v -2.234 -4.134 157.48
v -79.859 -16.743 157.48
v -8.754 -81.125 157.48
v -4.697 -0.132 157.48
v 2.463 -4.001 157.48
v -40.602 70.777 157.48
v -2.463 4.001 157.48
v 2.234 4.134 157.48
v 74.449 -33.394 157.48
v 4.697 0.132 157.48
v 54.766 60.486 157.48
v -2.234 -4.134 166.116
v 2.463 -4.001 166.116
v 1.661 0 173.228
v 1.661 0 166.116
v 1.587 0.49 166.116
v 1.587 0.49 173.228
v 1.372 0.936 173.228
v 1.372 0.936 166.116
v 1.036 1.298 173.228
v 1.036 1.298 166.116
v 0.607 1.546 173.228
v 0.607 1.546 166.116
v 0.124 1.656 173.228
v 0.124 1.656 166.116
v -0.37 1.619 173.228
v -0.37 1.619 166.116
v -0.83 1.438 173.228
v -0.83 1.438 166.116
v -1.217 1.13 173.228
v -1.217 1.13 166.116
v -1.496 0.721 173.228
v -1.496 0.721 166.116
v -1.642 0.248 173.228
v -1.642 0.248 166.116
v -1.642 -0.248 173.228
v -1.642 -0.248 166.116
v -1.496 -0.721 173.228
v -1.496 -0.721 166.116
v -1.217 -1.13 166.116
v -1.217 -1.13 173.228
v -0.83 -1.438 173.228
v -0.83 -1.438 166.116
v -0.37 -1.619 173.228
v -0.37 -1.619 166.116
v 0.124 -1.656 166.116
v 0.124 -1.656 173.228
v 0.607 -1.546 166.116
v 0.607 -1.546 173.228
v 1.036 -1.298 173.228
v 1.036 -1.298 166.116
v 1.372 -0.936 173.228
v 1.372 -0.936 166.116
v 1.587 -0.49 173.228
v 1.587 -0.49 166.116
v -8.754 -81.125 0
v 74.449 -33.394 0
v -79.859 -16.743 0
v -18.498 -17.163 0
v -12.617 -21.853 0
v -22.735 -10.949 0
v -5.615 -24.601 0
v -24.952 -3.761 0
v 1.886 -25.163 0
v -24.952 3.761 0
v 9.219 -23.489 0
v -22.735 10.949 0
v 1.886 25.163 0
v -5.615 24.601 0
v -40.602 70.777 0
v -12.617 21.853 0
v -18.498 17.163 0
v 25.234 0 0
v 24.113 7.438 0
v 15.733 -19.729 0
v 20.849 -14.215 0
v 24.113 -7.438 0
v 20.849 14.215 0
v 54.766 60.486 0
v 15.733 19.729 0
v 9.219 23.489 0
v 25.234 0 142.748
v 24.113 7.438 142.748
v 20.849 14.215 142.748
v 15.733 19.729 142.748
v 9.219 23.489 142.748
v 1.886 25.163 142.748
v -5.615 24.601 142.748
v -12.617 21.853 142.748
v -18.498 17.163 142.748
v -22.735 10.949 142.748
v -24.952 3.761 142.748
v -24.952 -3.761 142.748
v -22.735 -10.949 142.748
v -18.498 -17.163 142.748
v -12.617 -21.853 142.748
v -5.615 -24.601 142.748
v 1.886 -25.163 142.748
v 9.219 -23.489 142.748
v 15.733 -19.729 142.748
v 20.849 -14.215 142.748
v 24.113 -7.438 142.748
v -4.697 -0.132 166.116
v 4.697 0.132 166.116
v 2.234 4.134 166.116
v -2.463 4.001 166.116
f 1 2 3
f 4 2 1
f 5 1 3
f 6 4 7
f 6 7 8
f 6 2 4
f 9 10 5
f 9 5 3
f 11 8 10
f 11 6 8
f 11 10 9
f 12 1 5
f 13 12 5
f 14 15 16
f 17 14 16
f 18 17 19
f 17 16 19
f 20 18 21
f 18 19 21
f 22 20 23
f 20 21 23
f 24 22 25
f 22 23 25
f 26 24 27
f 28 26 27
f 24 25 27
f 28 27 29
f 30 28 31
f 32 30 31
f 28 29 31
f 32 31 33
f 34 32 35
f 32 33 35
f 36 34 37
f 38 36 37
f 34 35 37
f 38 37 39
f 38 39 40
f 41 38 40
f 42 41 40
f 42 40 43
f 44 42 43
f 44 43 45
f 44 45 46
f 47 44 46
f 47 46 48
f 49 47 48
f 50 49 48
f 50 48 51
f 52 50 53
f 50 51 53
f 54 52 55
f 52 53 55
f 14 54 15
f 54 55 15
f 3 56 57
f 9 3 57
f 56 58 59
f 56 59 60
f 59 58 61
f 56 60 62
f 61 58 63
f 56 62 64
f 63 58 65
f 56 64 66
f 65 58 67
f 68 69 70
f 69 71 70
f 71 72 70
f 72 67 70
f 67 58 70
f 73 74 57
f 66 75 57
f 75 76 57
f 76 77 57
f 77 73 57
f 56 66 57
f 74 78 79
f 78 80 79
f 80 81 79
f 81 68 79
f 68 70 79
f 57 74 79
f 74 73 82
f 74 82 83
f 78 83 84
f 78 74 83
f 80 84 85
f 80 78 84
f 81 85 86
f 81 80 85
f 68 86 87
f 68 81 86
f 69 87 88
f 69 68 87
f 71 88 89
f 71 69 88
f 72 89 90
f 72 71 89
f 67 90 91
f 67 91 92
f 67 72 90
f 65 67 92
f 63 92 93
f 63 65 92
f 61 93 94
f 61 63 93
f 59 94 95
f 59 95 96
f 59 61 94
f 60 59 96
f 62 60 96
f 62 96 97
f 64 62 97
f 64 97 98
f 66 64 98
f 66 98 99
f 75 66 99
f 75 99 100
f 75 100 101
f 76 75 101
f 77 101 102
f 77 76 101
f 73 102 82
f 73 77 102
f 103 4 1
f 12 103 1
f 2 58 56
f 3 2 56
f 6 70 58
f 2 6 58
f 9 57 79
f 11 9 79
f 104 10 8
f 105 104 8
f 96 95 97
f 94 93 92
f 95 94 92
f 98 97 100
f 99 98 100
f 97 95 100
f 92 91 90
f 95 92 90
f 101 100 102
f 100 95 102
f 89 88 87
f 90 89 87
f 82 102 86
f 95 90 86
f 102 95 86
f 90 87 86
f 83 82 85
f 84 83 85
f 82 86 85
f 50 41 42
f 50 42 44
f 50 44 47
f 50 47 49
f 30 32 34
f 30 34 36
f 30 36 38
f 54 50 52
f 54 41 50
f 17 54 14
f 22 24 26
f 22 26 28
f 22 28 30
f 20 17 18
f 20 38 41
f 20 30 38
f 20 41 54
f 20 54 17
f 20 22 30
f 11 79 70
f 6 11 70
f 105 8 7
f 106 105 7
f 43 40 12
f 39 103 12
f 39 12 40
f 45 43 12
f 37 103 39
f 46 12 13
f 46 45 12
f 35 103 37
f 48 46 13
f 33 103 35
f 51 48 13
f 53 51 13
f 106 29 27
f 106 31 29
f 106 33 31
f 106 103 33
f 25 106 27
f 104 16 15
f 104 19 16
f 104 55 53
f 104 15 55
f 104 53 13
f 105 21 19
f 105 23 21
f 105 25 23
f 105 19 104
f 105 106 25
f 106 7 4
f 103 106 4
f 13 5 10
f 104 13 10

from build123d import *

# Parameters (mm, degrees)
F1_DEPTH = 157.48
F2_R     = 25.233792
F3_DEPTH = 142.748
F5_DEPTH = 8.636
F6_R     = 1.660828
F7_DEPTH = 7.112


with BuildPart() as f1:
    # F0 (on Top) → F1 (new body)
    with BuildSketch(Plane.XY):
        Polygon((-8.753945, -81.124703), (74.44906, -33.394409), (54.765995, 60.485824), (-40.601814, 70.776703), (-79.859295, -16.743415), align=None)
    extrude(amount=F1_DEPTH)

    # F2 (on Top) → F3 (cut)
    with BuildSketch(Plane.XY):
        Circle(F2_R)
    extrude(amount=F3_DEPTH, mode=Mode.SUBTRACT)

    # F4 (on face) → F5 (join)
    with BuildSketch(Plane.XY.offset(157.48)):
        Polygon((2.463029, -4.001475), (4.696893, 0.132308), (2.233864, 4.133783), (-2.463029, 4.001475), (-4.696893, -0.132308), (-2.233864, -4.133783), align=None)
    extrude(amount=F5_DEPTH)

    # F6 (on face) → F7 (join)
    with BuildSketch(Plane.XY.offset(166.116)):
        Circle(F6_R)
    extrude(amount=F7_DEPTH)


solid = f1.part
